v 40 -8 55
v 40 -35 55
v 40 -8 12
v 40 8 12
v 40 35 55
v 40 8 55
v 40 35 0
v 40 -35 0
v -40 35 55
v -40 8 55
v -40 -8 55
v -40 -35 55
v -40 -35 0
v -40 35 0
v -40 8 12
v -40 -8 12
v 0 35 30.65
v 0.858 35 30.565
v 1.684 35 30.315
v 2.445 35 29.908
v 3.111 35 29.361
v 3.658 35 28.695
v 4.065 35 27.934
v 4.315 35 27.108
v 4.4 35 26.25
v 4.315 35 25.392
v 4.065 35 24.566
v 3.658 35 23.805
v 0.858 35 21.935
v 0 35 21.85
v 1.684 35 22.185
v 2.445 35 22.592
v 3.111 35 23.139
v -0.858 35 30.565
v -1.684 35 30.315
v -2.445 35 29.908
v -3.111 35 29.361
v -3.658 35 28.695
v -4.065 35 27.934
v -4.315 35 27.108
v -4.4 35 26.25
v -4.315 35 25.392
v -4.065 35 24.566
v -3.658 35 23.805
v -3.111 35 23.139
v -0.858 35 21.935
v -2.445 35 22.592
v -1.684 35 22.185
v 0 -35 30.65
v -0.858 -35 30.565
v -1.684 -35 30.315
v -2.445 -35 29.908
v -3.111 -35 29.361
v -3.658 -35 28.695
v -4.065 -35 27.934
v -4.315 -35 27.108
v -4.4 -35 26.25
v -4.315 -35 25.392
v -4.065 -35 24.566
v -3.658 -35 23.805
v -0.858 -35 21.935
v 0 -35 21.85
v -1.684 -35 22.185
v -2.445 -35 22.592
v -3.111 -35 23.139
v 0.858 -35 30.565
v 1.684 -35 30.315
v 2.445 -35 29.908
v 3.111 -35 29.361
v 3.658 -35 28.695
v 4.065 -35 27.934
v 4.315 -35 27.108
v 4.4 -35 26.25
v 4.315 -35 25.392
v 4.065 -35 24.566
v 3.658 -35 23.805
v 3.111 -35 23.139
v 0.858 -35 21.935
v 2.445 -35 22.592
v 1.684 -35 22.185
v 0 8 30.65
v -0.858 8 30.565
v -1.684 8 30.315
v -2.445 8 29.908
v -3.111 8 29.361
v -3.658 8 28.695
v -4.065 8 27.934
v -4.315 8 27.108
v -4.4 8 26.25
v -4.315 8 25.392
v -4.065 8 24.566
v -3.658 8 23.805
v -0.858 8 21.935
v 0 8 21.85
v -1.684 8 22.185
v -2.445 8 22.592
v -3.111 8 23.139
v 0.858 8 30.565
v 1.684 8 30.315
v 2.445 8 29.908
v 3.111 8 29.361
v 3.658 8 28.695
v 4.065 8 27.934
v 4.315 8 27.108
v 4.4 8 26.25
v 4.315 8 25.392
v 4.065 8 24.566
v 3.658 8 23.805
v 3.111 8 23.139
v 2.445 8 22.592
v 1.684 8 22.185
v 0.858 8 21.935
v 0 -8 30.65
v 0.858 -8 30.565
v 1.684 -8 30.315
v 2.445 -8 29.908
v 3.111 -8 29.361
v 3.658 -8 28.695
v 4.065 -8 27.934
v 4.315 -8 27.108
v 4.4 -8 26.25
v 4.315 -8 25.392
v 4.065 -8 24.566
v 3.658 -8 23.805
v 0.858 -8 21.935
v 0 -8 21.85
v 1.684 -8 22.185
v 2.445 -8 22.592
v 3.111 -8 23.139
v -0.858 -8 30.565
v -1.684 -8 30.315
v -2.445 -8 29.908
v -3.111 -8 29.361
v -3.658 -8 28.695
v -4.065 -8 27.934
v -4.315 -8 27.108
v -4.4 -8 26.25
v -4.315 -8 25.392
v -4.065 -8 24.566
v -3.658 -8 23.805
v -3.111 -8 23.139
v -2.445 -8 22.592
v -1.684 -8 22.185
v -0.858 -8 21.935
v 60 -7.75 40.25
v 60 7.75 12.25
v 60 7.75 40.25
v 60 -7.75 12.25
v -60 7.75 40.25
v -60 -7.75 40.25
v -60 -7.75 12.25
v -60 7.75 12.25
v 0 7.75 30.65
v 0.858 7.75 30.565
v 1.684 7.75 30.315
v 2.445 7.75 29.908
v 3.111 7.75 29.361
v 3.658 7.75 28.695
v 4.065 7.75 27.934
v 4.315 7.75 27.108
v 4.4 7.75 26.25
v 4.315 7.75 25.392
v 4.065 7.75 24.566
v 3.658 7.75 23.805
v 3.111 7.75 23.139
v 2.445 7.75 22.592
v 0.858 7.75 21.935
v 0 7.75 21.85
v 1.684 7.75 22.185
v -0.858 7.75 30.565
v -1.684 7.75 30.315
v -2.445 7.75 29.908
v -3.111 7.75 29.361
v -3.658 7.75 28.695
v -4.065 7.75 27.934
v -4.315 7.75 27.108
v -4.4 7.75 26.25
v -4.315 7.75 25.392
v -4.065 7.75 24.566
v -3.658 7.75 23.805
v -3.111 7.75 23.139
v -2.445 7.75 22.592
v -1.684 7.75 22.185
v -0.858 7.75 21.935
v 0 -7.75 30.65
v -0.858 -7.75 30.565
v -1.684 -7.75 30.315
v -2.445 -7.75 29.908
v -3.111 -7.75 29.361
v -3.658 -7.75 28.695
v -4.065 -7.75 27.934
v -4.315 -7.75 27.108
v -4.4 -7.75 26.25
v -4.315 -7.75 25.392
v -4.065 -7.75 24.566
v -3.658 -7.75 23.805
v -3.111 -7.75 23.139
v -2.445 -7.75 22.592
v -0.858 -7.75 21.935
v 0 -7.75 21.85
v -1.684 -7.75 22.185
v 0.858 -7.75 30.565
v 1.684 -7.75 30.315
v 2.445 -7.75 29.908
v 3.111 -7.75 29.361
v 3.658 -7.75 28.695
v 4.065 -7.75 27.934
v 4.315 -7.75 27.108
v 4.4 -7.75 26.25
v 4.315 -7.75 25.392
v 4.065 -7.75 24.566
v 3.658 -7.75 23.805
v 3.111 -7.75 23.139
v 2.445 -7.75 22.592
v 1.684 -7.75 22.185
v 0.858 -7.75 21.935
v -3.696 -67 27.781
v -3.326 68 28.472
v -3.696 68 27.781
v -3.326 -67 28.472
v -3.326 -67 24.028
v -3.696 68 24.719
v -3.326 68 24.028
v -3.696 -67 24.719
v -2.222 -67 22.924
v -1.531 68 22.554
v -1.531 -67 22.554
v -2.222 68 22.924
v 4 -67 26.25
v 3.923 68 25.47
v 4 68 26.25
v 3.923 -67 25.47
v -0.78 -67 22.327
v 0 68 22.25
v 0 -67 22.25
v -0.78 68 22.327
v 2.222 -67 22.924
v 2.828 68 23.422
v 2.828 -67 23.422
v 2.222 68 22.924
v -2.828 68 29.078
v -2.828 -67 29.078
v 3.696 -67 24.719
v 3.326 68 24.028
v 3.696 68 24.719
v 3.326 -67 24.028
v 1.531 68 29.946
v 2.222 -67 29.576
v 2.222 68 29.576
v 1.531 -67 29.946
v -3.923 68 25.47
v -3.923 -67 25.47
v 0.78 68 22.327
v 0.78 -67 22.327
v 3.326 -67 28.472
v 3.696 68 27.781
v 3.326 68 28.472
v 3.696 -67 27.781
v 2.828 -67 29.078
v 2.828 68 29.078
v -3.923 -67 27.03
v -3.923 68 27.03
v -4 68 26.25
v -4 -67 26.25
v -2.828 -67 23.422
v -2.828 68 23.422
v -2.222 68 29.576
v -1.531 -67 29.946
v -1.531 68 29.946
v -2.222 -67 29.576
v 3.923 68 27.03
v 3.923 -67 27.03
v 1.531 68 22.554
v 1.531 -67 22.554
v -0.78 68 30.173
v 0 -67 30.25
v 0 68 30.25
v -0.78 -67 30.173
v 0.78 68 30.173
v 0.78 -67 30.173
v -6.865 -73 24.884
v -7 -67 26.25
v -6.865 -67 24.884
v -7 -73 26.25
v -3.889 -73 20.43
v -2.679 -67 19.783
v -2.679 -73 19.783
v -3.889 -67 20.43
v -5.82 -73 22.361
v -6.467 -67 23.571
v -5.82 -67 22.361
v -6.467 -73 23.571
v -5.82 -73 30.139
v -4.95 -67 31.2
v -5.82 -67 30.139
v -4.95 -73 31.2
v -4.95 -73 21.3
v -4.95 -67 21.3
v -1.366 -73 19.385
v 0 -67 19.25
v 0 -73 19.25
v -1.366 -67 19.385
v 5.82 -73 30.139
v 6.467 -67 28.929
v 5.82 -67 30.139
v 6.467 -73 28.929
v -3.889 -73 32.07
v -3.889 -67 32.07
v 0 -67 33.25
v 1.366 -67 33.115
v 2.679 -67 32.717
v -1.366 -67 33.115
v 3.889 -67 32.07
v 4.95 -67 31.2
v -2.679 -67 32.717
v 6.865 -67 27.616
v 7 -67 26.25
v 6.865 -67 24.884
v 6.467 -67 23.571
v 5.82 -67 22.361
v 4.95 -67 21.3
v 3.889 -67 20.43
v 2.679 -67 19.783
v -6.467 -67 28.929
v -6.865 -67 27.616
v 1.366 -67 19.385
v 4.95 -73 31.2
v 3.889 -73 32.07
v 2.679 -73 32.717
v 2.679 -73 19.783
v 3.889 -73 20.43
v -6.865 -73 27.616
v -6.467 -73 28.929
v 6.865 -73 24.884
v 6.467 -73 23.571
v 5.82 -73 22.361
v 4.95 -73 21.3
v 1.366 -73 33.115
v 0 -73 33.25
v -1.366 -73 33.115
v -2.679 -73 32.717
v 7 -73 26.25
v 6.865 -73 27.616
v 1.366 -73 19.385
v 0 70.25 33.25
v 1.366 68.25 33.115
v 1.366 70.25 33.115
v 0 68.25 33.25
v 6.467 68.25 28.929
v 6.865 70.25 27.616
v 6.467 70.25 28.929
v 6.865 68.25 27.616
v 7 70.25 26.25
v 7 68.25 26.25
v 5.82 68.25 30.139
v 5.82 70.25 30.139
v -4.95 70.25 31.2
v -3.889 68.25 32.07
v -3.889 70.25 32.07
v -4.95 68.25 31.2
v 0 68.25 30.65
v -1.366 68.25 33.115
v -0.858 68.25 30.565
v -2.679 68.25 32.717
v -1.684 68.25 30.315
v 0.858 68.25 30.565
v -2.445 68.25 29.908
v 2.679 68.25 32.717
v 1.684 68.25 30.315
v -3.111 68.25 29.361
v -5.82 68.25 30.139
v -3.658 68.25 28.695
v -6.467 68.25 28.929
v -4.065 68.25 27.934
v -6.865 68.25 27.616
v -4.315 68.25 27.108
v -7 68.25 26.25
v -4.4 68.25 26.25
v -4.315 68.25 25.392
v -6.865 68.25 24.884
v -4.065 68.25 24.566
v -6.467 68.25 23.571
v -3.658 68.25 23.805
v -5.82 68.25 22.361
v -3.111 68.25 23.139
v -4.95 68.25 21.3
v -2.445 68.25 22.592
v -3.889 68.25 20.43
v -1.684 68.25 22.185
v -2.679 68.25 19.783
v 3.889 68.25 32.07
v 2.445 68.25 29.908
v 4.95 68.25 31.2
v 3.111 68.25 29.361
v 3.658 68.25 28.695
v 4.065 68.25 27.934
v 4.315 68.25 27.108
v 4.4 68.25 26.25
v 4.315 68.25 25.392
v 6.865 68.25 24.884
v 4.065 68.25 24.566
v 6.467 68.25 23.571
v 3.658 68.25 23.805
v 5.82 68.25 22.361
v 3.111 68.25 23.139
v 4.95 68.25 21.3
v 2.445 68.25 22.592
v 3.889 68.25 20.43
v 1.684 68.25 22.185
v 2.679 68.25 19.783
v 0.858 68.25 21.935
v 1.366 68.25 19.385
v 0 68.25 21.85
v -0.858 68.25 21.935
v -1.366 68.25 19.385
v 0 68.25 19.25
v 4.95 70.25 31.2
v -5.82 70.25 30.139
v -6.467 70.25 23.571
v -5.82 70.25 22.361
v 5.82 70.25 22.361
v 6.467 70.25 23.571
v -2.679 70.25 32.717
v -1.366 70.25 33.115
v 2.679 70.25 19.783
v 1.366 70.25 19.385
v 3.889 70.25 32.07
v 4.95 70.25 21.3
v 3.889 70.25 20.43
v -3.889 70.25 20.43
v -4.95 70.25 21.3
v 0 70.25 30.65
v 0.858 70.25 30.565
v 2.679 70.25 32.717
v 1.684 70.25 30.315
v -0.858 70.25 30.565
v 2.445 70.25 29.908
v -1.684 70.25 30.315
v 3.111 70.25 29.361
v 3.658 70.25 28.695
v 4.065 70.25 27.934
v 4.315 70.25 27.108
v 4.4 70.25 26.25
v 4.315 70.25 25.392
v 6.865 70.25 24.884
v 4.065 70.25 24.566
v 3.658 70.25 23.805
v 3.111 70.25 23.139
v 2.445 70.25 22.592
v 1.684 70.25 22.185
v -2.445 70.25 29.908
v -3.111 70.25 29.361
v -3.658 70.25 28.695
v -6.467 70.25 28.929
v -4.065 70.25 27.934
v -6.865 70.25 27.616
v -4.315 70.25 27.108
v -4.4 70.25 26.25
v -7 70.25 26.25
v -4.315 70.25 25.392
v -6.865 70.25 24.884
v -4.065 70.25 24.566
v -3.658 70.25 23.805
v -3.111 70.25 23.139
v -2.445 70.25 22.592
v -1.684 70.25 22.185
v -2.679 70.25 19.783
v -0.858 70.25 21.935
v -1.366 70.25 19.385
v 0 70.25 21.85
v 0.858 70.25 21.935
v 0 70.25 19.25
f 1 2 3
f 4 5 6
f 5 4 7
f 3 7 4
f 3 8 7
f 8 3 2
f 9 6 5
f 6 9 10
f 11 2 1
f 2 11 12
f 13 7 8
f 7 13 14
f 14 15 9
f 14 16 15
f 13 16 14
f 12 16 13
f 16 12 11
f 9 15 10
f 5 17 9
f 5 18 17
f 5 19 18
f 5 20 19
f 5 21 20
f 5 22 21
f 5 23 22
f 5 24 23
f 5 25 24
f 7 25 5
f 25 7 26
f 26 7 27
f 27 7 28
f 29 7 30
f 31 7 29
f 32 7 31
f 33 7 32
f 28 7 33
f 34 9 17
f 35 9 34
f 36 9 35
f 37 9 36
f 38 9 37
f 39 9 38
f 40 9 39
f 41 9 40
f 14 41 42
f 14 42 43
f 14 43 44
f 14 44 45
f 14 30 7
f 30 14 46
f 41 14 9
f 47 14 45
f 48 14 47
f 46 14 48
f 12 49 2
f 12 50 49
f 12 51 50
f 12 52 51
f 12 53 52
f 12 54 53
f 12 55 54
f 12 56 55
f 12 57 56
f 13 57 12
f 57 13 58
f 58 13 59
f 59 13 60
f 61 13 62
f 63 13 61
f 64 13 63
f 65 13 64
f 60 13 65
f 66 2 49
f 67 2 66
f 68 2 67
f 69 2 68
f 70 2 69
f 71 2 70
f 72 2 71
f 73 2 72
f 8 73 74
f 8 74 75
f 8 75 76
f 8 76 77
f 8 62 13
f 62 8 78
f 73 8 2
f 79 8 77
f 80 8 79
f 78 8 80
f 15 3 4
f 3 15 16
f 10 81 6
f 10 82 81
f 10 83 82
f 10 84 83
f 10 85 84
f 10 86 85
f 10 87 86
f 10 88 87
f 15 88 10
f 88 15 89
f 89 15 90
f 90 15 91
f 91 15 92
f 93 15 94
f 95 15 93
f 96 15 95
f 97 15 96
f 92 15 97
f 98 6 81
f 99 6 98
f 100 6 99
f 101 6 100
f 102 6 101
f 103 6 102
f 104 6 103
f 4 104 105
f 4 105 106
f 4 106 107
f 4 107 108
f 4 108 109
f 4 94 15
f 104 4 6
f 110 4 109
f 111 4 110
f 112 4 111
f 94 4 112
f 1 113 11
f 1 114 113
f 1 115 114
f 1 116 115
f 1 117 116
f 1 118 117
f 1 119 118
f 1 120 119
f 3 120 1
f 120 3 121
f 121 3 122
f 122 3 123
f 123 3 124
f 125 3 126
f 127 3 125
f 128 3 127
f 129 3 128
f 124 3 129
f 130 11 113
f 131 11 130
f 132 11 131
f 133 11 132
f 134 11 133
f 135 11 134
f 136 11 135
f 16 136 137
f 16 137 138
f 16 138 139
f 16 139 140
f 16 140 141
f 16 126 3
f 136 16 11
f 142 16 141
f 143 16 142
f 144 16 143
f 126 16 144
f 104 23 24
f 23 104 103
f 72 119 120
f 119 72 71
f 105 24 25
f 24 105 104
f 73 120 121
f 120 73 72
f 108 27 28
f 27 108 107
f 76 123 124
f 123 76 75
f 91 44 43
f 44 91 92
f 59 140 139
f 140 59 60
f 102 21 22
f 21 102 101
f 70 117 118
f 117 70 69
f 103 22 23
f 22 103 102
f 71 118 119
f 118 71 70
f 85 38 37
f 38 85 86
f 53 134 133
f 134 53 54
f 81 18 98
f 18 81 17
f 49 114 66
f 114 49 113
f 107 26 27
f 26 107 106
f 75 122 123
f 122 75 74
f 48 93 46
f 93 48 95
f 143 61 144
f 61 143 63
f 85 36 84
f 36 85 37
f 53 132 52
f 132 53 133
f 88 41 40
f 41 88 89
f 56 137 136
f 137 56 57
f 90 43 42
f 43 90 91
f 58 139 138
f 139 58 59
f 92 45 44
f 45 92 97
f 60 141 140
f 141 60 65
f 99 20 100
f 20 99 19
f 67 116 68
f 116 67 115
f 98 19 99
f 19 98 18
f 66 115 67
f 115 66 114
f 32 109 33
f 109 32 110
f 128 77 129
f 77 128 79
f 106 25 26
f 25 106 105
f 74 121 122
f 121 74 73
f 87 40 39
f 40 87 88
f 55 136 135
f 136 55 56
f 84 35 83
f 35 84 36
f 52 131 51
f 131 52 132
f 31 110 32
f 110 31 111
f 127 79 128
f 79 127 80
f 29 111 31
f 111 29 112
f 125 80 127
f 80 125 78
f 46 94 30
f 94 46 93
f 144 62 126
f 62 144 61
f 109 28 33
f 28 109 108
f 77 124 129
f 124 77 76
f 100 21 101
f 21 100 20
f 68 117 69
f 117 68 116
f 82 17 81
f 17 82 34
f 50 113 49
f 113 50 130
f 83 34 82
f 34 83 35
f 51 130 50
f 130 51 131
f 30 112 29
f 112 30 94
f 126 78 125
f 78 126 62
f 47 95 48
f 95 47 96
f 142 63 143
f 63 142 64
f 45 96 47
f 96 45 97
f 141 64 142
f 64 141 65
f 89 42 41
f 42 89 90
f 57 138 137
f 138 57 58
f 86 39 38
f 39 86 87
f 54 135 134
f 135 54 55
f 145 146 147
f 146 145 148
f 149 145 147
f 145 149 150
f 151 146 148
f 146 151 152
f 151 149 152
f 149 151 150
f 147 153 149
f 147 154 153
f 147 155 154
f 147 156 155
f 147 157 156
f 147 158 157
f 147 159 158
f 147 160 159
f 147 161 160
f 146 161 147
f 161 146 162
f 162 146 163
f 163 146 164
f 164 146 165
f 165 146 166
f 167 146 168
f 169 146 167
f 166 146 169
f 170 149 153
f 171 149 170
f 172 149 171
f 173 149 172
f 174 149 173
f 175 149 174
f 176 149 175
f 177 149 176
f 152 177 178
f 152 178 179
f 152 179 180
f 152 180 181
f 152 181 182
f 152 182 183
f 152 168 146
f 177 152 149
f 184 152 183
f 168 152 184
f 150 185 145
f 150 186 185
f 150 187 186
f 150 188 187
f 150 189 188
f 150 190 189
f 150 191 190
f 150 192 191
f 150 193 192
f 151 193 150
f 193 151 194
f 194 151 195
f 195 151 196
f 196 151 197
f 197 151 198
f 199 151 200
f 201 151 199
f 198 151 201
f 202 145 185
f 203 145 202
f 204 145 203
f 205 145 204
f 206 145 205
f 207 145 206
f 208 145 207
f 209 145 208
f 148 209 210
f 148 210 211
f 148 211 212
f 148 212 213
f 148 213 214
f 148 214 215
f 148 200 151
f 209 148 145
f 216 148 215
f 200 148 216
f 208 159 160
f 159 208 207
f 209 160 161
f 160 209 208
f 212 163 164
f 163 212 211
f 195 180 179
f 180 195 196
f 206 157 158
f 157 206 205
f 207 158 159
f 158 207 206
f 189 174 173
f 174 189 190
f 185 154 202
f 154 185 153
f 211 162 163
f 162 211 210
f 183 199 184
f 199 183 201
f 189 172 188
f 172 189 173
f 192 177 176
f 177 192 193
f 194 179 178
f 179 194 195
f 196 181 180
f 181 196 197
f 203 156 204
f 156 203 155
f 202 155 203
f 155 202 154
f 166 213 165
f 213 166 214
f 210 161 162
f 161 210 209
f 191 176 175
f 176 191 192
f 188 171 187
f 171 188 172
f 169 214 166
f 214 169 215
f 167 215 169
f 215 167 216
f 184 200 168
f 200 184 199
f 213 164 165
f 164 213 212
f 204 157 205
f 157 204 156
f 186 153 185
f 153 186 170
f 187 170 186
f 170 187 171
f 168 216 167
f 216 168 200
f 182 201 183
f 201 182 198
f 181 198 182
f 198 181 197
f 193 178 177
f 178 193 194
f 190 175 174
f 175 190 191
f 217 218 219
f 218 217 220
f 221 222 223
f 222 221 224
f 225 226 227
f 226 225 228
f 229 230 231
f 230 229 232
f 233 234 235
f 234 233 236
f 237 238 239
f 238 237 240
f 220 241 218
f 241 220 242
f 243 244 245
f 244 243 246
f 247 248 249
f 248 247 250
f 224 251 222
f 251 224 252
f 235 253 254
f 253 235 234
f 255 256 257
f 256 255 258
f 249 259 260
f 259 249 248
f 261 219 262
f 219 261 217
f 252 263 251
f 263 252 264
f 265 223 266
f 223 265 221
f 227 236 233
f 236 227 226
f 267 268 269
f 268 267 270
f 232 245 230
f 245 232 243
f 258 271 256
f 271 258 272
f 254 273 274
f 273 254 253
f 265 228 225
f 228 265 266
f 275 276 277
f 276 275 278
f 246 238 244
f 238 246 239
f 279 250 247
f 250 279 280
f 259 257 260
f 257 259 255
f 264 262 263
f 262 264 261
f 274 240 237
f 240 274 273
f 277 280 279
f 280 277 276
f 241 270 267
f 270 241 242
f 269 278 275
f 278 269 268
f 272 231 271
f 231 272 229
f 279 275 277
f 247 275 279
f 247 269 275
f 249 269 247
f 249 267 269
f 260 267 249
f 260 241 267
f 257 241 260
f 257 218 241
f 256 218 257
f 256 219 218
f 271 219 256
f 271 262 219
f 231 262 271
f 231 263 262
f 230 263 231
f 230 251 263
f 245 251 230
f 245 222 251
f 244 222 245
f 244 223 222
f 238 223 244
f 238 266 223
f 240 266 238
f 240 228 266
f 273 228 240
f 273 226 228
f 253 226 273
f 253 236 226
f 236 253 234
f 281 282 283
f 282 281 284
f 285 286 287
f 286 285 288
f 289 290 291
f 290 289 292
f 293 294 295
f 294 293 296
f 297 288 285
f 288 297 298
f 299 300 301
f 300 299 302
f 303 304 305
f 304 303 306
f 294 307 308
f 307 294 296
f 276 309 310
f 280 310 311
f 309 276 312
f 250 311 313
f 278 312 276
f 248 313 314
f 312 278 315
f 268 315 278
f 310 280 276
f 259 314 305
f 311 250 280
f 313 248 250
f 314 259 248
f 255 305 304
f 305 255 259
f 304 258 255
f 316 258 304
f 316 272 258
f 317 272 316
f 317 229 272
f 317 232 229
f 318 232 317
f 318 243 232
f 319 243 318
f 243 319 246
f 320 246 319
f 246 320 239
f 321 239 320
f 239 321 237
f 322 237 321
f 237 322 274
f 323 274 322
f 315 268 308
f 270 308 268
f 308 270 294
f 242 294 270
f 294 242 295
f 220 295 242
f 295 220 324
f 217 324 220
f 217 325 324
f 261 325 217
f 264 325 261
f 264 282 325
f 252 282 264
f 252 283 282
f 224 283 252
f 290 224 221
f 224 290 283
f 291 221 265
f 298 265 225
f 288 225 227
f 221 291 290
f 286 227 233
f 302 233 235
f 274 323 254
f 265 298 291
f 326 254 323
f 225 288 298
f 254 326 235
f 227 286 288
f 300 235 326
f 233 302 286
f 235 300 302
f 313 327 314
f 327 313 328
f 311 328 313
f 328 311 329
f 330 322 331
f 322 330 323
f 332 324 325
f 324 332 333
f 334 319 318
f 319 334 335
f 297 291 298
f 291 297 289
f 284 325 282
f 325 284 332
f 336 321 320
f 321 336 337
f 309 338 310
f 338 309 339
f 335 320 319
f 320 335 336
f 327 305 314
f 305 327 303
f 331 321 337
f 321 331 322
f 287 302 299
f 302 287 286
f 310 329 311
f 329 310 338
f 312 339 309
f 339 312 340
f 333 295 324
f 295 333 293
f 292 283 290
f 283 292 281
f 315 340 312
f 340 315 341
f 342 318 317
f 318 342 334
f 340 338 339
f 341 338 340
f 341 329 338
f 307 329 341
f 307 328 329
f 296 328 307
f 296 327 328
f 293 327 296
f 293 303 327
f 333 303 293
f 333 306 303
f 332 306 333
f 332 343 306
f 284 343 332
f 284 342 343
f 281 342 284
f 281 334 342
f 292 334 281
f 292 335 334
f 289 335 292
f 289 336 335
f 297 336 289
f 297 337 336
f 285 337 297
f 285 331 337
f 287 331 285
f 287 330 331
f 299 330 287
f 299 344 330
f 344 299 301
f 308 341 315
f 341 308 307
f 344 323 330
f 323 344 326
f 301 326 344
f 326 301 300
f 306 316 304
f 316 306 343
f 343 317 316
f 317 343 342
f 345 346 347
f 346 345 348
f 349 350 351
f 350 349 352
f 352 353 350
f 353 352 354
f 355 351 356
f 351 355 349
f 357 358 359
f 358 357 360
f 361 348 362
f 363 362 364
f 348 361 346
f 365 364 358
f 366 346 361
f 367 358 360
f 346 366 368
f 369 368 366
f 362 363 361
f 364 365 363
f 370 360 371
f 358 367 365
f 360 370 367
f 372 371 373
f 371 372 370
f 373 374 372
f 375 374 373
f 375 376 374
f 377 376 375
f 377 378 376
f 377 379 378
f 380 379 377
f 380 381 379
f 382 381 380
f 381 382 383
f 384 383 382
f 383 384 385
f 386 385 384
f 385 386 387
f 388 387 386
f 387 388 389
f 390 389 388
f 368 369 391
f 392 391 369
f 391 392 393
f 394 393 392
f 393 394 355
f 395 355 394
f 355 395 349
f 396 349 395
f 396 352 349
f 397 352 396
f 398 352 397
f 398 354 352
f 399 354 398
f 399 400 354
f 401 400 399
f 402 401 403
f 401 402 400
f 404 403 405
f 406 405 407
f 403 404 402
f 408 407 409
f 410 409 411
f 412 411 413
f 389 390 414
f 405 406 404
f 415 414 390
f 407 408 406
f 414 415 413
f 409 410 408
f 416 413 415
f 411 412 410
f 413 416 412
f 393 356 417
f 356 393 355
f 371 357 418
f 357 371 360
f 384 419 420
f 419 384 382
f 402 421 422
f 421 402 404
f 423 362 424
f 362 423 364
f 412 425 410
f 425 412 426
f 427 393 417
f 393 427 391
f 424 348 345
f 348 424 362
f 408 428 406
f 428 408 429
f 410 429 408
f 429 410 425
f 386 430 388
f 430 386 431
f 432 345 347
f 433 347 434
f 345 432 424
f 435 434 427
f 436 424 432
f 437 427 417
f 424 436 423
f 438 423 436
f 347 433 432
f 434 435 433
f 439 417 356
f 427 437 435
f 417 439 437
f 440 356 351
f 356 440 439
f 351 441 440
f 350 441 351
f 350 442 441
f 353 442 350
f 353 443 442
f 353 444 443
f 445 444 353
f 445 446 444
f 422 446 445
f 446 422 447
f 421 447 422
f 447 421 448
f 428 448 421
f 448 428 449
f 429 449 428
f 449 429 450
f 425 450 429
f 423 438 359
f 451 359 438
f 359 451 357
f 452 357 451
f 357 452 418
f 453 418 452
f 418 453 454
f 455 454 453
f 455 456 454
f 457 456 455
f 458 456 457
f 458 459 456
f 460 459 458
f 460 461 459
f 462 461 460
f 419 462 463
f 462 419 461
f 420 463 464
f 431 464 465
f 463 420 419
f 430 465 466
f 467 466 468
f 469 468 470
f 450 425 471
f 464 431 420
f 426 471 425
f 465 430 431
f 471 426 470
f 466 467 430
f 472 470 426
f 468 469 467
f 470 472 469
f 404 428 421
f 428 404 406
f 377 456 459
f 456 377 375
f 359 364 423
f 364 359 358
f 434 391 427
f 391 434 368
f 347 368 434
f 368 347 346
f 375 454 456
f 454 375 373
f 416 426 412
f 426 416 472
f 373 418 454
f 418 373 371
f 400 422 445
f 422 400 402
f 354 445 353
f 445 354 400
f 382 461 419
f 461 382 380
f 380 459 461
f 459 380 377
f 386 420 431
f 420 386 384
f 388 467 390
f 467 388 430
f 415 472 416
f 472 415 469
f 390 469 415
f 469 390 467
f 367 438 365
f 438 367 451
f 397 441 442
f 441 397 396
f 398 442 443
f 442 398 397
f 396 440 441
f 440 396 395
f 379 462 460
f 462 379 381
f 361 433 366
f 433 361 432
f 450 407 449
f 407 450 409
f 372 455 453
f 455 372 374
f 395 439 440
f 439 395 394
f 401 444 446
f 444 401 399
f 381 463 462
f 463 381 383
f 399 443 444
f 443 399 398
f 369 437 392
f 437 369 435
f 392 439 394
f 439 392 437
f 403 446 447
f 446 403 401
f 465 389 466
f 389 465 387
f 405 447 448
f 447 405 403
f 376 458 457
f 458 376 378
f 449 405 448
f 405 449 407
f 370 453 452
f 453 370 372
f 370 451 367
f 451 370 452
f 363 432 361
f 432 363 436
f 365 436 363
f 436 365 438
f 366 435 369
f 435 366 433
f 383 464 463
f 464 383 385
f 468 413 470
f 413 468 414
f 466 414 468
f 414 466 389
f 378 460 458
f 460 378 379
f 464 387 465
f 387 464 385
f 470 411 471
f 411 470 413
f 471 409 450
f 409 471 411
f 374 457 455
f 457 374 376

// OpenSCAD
$fn = 32;

// ------------------------------------------------------------------------
// Clevis joint: 80 mm clevis, pin d8
// Every part is its own module, assembly() places them once.
// ------------------------------------------------------------------------

// --- part 1 ---
module clevis() {
  difference() {
    translate([-40, -35, 0]) cube([80, 70, 55]);
    translate([-41, -8, 12]) cube([82, 16, 44]);
    translate([0, 0, 26.25]) rotate([90, 0, 0]) cylinder(h = 72, d = 8.8, center = true);
  }
}

// --- part 2 ---
module eye() {
  difference() {
    translate([-60, -7.75, 0]) cube([120, 15.5, 28]);
    translate([0, 0, 14]) rotate([90, 0, 0]) cylinder(h = 17.5, d = 8.8, center = true);
  }
}

// --- part 3 ---
module pin() {
  rotate([0, 90, 0]) cylinder(h = 136, d = 8, center = true);
  translate([-73, 0, 0]) rotate([0, 90, 0]) cylinder(h = 6, d = 14);
}

// --- part 4 ---
module retainer() {
  difference() {
      translate([0, 0, 0]) cylinder(h = 2, d = 14);
      translate([0, 0, -1]) cylinder(h = 4, d = 8.8);
    }
}

// --- assembly ---
module assembly() {
  translate([0, 0, 0]) rotate([0, 0, 0]) clevis();
  translate([0, 0, 12.25]) rotate([0, 0, 0]) eye();
  translate([0, 0, 26.25]) rotate([0, 0, 90]) pin();
  translate([0, 70.25, 26.25]) rotate([90, 0, 0]) retainer();
}

assembly();
